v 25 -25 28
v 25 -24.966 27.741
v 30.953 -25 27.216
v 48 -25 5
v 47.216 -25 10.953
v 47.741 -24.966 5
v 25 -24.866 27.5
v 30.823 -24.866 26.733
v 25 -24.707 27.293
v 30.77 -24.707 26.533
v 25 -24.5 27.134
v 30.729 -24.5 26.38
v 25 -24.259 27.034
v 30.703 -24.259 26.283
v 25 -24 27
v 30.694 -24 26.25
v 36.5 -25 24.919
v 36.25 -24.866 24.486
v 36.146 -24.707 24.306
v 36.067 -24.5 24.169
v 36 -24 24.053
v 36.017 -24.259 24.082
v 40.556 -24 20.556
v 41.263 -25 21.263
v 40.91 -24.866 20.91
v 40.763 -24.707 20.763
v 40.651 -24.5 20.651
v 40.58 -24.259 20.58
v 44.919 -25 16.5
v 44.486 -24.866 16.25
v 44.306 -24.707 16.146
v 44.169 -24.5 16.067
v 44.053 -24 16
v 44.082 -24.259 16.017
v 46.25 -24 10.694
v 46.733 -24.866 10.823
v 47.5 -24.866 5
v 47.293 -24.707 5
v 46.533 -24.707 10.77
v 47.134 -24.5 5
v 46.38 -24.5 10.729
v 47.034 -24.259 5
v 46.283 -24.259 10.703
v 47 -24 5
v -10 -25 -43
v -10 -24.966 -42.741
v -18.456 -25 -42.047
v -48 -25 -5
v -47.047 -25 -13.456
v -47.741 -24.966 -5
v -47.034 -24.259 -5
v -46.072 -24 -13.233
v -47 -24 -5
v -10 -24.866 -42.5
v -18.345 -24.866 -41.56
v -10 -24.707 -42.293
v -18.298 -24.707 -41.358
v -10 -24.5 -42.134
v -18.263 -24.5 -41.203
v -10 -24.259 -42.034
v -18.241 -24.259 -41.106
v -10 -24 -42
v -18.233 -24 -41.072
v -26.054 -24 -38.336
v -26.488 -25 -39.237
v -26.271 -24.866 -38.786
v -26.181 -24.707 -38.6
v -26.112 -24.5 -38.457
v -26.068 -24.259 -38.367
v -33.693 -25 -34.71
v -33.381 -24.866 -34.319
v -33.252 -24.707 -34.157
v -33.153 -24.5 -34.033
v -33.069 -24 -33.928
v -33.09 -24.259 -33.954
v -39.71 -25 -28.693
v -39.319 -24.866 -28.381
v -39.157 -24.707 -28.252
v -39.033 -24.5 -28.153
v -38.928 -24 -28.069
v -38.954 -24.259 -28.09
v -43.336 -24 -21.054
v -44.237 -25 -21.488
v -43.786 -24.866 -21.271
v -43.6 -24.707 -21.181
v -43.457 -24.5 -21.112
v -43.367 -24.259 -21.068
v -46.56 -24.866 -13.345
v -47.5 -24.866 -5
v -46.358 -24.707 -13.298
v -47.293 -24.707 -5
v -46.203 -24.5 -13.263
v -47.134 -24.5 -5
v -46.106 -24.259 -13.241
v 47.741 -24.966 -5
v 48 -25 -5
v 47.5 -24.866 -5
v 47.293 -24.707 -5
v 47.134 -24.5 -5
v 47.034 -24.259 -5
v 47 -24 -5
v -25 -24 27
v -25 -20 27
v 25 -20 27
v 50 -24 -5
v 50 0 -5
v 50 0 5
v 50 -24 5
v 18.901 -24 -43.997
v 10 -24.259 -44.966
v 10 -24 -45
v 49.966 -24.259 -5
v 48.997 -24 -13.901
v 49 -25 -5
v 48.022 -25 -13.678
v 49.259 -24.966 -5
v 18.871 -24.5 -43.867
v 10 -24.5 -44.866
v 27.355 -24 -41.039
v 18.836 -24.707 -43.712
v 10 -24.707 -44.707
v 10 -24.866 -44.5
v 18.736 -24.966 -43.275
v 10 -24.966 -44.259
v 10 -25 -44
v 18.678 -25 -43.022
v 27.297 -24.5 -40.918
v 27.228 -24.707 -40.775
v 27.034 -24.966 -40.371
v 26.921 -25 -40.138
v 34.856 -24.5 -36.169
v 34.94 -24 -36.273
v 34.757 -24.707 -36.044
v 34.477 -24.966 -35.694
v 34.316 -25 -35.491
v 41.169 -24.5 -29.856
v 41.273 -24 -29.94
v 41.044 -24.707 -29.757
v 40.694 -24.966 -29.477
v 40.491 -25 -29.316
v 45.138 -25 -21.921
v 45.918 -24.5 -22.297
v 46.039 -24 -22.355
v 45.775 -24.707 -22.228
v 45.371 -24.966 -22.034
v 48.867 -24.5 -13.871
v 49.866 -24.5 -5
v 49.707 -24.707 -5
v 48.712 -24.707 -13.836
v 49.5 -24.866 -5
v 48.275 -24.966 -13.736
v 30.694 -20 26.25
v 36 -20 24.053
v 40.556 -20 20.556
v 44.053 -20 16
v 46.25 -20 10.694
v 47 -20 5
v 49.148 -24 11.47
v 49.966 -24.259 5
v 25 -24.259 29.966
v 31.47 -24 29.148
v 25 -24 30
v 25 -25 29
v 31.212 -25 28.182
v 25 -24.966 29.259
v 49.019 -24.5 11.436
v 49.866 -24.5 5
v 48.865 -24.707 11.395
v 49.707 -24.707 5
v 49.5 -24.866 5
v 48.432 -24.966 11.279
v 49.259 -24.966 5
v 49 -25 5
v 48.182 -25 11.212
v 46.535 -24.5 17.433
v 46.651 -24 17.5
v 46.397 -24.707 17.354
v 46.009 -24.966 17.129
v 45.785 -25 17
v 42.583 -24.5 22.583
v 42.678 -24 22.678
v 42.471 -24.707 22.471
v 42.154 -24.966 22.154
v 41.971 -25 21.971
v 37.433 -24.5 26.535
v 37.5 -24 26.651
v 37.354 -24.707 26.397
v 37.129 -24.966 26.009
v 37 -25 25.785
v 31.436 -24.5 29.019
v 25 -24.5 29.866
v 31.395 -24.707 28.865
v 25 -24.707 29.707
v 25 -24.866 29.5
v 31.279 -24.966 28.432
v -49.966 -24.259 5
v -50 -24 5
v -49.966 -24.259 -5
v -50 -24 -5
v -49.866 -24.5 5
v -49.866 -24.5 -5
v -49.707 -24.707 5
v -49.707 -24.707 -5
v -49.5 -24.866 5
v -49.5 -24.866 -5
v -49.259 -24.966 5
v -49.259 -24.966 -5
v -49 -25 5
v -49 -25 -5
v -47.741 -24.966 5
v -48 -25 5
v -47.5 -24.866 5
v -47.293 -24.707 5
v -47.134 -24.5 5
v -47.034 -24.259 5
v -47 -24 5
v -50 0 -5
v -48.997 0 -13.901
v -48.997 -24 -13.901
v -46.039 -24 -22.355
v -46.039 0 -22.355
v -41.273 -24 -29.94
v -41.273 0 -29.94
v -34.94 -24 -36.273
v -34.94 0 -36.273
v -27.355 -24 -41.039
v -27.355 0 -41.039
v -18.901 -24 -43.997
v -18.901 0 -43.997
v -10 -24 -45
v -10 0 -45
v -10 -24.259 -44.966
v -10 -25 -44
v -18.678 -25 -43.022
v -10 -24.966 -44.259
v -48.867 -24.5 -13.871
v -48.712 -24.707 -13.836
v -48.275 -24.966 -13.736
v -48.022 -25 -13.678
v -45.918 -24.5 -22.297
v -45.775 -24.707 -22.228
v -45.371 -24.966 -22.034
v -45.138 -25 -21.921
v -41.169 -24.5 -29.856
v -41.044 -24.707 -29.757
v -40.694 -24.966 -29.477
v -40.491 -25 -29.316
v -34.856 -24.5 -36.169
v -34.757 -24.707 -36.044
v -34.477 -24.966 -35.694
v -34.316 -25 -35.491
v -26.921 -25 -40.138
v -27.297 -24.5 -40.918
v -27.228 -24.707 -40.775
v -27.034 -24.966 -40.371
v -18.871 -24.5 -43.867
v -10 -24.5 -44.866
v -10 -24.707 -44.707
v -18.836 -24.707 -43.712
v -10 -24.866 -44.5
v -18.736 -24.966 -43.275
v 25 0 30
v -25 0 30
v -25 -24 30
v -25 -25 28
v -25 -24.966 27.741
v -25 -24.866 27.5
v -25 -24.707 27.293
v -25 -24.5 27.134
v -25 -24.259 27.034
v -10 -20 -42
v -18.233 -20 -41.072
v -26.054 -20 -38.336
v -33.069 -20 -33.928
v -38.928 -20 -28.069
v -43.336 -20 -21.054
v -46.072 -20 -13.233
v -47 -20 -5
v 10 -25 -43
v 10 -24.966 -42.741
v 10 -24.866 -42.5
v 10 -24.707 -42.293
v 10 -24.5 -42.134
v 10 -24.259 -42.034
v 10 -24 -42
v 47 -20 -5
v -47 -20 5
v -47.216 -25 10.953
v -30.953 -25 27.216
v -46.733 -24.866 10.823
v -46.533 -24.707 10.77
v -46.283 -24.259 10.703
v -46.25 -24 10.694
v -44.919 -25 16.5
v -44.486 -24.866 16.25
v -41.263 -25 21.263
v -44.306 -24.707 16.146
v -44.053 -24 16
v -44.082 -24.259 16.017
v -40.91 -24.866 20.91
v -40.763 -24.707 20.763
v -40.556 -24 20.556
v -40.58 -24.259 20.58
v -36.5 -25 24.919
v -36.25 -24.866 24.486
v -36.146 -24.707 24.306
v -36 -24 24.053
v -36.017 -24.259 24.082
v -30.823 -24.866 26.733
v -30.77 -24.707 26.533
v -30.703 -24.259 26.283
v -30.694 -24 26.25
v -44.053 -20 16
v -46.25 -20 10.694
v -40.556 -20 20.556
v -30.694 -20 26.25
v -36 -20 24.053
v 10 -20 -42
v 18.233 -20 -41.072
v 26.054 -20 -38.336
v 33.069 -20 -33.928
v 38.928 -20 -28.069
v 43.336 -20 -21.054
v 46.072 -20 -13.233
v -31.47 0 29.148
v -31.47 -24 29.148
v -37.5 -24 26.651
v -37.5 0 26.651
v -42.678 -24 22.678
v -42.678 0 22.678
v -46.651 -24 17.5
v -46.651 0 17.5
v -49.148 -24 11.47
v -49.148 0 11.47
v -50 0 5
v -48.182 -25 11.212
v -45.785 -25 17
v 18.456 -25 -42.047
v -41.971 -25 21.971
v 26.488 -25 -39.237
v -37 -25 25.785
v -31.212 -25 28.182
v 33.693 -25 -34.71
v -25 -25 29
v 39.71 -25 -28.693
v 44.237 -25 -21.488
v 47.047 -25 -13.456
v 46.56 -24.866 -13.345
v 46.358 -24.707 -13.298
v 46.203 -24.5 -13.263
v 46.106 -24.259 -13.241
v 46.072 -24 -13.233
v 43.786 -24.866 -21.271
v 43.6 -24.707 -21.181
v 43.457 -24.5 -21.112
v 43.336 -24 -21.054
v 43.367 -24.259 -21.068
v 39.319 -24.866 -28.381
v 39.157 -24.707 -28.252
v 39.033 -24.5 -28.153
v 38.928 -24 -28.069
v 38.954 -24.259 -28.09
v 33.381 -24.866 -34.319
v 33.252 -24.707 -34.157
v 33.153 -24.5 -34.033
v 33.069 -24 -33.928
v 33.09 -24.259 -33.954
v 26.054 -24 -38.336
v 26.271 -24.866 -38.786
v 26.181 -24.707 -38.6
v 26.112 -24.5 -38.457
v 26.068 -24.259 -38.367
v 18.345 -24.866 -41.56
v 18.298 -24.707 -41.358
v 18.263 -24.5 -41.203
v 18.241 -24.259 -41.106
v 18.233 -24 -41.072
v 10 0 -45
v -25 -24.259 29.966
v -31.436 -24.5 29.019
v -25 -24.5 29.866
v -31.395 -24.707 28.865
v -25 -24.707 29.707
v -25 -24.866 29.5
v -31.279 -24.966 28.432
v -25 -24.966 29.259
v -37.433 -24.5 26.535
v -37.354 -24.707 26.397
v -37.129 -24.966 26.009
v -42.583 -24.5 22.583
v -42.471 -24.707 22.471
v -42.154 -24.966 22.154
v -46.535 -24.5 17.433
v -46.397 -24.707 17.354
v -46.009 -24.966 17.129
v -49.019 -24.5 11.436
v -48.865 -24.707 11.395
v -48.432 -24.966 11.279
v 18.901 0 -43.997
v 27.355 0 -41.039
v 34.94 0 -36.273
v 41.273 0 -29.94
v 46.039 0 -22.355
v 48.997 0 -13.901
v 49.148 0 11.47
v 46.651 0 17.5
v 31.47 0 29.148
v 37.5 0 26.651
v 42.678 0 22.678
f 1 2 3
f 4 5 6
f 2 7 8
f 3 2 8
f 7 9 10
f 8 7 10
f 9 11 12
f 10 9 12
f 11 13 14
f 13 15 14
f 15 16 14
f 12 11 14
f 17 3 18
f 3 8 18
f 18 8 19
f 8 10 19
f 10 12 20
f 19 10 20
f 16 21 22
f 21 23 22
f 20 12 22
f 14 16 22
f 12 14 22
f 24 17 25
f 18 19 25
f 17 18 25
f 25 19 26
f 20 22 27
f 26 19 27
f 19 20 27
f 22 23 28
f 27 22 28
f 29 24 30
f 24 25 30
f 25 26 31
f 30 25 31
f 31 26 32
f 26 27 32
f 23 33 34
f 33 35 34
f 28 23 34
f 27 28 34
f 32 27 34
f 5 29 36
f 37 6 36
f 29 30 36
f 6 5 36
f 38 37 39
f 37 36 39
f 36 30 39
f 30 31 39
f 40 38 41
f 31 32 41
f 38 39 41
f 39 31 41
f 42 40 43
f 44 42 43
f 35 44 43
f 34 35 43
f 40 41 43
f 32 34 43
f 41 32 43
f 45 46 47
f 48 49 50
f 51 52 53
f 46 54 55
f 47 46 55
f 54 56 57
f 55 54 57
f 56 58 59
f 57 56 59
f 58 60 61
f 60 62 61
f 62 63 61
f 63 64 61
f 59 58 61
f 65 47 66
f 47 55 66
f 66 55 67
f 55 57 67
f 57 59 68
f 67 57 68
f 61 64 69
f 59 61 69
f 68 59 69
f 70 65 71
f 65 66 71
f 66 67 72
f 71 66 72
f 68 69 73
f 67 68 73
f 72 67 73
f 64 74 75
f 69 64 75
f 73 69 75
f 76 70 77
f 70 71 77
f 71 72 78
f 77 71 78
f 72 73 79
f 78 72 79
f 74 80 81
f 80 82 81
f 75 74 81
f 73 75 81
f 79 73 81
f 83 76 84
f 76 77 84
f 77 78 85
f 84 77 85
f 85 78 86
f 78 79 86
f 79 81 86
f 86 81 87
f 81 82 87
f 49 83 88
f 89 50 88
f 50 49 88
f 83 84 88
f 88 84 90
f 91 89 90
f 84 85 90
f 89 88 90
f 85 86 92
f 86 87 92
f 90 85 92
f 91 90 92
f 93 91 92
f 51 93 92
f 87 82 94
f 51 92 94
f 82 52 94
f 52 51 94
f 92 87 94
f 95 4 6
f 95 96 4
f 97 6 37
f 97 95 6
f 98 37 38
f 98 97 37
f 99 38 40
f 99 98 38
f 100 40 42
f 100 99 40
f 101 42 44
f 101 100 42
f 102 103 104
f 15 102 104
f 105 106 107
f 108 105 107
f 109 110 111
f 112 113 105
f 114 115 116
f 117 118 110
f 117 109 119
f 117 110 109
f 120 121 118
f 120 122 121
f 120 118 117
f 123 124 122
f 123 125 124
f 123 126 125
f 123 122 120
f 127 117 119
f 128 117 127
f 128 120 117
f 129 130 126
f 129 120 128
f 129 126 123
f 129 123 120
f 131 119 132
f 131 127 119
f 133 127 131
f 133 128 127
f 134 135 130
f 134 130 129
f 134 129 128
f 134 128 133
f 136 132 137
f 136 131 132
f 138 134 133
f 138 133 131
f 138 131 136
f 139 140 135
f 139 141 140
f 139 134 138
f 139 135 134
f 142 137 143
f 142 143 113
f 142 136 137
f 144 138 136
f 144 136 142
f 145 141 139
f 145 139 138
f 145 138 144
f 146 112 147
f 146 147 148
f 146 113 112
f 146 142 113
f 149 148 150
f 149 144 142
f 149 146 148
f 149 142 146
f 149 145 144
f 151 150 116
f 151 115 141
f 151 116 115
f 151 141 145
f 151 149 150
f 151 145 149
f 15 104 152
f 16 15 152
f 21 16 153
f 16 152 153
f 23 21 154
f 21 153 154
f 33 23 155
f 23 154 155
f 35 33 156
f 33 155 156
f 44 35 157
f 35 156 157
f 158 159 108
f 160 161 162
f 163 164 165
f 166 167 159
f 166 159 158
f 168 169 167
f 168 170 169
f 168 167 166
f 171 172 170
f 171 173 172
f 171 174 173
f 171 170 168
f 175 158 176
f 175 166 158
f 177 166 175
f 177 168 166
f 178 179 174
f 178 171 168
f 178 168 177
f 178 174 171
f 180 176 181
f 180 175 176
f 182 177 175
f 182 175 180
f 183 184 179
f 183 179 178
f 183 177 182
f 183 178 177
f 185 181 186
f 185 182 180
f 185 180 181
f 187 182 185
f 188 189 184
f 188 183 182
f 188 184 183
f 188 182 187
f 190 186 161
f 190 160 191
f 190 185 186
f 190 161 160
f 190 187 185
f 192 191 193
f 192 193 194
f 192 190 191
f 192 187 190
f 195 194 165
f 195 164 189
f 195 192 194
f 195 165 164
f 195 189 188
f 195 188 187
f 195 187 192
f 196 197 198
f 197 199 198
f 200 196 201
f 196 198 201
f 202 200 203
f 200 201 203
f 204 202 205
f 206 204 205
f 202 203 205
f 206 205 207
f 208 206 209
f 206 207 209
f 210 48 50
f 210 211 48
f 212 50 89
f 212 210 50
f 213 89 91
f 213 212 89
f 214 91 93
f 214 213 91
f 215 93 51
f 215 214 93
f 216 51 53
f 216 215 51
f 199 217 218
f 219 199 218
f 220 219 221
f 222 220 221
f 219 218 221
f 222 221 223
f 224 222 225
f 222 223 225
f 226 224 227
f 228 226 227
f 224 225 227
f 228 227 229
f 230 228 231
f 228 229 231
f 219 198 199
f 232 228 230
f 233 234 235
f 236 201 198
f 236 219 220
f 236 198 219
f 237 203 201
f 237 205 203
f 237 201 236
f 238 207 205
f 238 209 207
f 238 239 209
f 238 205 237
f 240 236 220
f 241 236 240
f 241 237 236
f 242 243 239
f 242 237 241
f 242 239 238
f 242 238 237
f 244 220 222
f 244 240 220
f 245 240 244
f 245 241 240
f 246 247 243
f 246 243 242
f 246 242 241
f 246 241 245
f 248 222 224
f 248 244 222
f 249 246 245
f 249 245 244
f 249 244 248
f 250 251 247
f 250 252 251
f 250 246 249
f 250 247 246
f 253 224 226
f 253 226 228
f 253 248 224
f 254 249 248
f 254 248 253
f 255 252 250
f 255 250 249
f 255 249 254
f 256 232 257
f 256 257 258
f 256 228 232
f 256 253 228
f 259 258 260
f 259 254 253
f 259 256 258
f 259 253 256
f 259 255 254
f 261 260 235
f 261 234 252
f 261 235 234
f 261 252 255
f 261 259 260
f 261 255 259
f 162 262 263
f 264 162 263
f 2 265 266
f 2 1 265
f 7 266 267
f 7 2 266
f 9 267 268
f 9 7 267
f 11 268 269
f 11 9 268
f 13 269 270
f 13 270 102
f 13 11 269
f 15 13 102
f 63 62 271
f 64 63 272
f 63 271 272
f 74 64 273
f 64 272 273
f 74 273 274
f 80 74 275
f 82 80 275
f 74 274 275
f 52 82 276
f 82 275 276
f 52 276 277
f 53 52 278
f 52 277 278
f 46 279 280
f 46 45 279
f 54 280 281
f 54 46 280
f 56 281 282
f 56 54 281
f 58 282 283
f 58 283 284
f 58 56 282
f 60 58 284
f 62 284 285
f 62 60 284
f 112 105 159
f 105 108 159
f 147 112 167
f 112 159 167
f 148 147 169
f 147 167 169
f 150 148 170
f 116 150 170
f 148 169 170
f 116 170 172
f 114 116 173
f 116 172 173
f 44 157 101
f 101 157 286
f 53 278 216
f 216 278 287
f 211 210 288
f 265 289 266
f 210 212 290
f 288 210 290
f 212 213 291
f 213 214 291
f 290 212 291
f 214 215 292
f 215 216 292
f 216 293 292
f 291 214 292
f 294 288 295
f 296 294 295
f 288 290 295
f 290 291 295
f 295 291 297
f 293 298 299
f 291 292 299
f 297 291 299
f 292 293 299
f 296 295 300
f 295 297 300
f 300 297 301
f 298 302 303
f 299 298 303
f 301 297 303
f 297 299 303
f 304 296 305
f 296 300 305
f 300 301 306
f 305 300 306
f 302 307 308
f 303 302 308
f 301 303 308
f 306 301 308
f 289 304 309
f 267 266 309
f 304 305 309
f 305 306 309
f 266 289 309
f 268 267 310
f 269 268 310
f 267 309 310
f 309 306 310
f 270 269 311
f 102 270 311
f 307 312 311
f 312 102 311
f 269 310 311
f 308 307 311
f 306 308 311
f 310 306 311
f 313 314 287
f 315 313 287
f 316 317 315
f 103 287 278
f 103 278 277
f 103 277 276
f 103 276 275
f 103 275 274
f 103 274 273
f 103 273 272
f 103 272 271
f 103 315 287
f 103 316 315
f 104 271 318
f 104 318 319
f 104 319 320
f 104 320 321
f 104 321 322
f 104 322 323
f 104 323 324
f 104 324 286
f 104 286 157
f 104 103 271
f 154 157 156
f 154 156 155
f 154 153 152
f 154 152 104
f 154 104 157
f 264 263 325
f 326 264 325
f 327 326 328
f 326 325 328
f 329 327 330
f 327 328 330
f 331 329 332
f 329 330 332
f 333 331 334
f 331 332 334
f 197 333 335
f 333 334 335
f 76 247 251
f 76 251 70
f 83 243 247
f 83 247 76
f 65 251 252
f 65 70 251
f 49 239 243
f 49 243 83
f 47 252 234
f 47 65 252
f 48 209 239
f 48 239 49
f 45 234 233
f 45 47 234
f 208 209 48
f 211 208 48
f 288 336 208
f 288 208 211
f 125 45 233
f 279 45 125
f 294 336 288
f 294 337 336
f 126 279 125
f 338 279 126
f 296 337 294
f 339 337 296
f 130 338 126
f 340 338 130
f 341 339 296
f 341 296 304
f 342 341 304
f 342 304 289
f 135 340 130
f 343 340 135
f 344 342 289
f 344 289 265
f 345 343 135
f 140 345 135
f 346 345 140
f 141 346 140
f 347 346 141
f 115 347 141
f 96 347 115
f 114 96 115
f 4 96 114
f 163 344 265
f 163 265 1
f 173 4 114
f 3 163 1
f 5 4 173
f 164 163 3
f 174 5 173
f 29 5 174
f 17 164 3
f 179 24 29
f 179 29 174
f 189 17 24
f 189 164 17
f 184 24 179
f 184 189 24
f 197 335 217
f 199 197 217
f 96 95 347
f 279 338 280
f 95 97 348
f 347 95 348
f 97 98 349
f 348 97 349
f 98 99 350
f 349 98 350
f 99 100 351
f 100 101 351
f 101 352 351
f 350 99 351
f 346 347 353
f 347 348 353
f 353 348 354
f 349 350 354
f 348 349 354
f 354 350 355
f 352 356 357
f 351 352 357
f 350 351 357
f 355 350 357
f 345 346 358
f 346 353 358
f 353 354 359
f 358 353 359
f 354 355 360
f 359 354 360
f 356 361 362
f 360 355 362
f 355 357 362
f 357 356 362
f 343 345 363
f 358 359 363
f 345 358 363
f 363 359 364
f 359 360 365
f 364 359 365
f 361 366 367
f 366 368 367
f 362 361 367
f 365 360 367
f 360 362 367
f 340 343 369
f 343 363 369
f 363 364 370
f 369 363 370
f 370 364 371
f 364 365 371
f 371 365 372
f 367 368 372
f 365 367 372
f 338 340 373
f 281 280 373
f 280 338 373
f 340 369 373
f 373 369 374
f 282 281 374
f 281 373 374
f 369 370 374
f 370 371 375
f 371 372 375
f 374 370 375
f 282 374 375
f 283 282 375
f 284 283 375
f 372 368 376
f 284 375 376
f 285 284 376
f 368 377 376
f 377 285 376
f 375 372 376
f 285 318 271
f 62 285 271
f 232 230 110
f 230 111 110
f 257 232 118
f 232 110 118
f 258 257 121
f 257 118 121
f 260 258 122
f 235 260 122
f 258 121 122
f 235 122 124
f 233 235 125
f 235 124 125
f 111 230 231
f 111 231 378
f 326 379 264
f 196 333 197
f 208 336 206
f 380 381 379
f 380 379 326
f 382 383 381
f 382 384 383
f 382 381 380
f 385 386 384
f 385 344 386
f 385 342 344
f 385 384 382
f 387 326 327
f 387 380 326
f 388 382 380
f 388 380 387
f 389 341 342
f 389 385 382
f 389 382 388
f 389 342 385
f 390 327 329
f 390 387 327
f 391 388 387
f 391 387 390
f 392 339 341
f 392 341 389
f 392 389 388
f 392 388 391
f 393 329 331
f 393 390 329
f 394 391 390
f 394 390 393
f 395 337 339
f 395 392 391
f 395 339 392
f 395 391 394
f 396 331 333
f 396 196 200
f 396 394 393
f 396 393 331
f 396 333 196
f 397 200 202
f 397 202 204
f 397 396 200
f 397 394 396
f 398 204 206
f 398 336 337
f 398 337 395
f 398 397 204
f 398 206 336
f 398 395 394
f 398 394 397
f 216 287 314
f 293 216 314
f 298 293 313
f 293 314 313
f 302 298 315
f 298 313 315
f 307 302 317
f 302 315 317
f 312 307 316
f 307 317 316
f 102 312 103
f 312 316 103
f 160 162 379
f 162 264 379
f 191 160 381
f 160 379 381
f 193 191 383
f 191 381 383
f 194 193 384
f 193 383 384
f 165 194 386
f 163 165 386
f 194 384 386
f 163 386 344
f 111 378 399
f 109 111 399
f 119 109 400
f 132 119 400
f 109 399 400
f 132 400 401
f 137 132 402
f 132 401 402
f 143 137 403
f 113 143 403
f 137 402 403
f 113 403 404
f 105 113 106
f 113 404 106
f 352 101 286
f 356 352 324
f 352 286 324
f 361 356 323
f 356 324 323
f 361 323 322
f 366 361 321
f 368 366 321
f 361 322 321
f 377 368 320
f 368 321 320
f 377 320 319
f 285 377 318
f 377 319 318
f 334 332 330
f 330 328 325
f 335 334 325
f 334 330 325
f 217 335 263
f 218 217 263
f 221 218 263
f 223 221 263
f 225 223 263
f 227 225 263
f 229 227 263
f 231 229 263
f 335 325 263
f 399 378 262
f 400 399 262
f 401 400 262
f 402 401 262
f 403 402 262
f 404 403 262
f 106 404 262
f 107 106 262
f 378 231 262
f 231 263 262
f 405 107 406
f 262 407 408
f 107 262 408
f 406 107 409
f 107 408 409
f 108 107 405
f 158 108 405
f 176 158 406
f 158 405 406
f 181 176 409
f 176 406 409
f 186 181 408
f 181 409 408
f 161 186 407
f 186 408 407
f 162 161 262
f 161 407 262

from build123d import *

# Parameters (mm, degrees)
F1_DEPTH = 20
F2_DEPTH = 25
F3_R     = 1


with BuildPart() as f1:
    # F0 (on Front) → F1 (new body)
    with BuildSketch(Plane.XZ):
        with BuildLine():
            Line((25, 27), (-25, 27))
            ThreePointArc((-25, 27), (-40.556349, 20.556349), (-47, 5))
            Line((-47, 5), (-47, -5))
            ThreePointArc((-47, -5), (-36.162951, -31.162951), (-10, -42))
            Line((-10, -42), (10, -42))
            ThreePointArc((10, -42), (36.162951, -31.162951), (47, -5))
            Line((47, -5), (47, 5))
            ThreePointArc((47, 5), (40.556349, 20.556349), (25, 27))
        make_face()
    extrude(amount=F1_DEPTH)

    # F0 (on Front) → F2 (join)
    with BuildSketch(Plane.XZ):
        with BuildLine():
            ThreePointArc((10, -45), (38.284271, -33.284271), (50, -5))
            Line((50, -5), (50, 5))
            ThreePointArc((50, 5), (42.67767, 22.67767), (25, 30))
            Line((25, 30), (-25, 30))
            ThreePointArc((-25, 30), (-42.67767, 22.67767), (-50, 5))
            Line((-50, 5), (-50, -5))
            ThreePointArc((-50, -5), (-38.284271, -33.284271), (-10, -45))
            Line((-10, -45), (10, -45))
        make_face()
        with BuildLine():
            ThreePointArc((-47, 5), (-40.556349, 20.556349), (-25, 27))
            Line((-25, 27), (25, 27))
            ThreePointArc((25, 27), (40.556349, 20.556349), (47, 5))
            Line((47, 5), (47, -5))
            ThreePointArc((47, -5), (36.162951, -31.162951), (10, -42))
            Line((10, -42), (-10, -42))
            ThreePointArc((-10, -42), (-36.162951, -31.162951), (-47, -5))
            Line((-47, -5), (-47, 5))
        make_face(mode=Mode.SUBTRACT)
    extrude(amount=F2_DEPTH)

    # F3
    f3_edges = [f1.edges().sort_by_distance(p)[0] for p in [
        (0, -25, 27),
        (38.284271, -25, -33.284271),
    ]]
    fillet(f3_edges, radius=F3_R)


solid = f1.part
